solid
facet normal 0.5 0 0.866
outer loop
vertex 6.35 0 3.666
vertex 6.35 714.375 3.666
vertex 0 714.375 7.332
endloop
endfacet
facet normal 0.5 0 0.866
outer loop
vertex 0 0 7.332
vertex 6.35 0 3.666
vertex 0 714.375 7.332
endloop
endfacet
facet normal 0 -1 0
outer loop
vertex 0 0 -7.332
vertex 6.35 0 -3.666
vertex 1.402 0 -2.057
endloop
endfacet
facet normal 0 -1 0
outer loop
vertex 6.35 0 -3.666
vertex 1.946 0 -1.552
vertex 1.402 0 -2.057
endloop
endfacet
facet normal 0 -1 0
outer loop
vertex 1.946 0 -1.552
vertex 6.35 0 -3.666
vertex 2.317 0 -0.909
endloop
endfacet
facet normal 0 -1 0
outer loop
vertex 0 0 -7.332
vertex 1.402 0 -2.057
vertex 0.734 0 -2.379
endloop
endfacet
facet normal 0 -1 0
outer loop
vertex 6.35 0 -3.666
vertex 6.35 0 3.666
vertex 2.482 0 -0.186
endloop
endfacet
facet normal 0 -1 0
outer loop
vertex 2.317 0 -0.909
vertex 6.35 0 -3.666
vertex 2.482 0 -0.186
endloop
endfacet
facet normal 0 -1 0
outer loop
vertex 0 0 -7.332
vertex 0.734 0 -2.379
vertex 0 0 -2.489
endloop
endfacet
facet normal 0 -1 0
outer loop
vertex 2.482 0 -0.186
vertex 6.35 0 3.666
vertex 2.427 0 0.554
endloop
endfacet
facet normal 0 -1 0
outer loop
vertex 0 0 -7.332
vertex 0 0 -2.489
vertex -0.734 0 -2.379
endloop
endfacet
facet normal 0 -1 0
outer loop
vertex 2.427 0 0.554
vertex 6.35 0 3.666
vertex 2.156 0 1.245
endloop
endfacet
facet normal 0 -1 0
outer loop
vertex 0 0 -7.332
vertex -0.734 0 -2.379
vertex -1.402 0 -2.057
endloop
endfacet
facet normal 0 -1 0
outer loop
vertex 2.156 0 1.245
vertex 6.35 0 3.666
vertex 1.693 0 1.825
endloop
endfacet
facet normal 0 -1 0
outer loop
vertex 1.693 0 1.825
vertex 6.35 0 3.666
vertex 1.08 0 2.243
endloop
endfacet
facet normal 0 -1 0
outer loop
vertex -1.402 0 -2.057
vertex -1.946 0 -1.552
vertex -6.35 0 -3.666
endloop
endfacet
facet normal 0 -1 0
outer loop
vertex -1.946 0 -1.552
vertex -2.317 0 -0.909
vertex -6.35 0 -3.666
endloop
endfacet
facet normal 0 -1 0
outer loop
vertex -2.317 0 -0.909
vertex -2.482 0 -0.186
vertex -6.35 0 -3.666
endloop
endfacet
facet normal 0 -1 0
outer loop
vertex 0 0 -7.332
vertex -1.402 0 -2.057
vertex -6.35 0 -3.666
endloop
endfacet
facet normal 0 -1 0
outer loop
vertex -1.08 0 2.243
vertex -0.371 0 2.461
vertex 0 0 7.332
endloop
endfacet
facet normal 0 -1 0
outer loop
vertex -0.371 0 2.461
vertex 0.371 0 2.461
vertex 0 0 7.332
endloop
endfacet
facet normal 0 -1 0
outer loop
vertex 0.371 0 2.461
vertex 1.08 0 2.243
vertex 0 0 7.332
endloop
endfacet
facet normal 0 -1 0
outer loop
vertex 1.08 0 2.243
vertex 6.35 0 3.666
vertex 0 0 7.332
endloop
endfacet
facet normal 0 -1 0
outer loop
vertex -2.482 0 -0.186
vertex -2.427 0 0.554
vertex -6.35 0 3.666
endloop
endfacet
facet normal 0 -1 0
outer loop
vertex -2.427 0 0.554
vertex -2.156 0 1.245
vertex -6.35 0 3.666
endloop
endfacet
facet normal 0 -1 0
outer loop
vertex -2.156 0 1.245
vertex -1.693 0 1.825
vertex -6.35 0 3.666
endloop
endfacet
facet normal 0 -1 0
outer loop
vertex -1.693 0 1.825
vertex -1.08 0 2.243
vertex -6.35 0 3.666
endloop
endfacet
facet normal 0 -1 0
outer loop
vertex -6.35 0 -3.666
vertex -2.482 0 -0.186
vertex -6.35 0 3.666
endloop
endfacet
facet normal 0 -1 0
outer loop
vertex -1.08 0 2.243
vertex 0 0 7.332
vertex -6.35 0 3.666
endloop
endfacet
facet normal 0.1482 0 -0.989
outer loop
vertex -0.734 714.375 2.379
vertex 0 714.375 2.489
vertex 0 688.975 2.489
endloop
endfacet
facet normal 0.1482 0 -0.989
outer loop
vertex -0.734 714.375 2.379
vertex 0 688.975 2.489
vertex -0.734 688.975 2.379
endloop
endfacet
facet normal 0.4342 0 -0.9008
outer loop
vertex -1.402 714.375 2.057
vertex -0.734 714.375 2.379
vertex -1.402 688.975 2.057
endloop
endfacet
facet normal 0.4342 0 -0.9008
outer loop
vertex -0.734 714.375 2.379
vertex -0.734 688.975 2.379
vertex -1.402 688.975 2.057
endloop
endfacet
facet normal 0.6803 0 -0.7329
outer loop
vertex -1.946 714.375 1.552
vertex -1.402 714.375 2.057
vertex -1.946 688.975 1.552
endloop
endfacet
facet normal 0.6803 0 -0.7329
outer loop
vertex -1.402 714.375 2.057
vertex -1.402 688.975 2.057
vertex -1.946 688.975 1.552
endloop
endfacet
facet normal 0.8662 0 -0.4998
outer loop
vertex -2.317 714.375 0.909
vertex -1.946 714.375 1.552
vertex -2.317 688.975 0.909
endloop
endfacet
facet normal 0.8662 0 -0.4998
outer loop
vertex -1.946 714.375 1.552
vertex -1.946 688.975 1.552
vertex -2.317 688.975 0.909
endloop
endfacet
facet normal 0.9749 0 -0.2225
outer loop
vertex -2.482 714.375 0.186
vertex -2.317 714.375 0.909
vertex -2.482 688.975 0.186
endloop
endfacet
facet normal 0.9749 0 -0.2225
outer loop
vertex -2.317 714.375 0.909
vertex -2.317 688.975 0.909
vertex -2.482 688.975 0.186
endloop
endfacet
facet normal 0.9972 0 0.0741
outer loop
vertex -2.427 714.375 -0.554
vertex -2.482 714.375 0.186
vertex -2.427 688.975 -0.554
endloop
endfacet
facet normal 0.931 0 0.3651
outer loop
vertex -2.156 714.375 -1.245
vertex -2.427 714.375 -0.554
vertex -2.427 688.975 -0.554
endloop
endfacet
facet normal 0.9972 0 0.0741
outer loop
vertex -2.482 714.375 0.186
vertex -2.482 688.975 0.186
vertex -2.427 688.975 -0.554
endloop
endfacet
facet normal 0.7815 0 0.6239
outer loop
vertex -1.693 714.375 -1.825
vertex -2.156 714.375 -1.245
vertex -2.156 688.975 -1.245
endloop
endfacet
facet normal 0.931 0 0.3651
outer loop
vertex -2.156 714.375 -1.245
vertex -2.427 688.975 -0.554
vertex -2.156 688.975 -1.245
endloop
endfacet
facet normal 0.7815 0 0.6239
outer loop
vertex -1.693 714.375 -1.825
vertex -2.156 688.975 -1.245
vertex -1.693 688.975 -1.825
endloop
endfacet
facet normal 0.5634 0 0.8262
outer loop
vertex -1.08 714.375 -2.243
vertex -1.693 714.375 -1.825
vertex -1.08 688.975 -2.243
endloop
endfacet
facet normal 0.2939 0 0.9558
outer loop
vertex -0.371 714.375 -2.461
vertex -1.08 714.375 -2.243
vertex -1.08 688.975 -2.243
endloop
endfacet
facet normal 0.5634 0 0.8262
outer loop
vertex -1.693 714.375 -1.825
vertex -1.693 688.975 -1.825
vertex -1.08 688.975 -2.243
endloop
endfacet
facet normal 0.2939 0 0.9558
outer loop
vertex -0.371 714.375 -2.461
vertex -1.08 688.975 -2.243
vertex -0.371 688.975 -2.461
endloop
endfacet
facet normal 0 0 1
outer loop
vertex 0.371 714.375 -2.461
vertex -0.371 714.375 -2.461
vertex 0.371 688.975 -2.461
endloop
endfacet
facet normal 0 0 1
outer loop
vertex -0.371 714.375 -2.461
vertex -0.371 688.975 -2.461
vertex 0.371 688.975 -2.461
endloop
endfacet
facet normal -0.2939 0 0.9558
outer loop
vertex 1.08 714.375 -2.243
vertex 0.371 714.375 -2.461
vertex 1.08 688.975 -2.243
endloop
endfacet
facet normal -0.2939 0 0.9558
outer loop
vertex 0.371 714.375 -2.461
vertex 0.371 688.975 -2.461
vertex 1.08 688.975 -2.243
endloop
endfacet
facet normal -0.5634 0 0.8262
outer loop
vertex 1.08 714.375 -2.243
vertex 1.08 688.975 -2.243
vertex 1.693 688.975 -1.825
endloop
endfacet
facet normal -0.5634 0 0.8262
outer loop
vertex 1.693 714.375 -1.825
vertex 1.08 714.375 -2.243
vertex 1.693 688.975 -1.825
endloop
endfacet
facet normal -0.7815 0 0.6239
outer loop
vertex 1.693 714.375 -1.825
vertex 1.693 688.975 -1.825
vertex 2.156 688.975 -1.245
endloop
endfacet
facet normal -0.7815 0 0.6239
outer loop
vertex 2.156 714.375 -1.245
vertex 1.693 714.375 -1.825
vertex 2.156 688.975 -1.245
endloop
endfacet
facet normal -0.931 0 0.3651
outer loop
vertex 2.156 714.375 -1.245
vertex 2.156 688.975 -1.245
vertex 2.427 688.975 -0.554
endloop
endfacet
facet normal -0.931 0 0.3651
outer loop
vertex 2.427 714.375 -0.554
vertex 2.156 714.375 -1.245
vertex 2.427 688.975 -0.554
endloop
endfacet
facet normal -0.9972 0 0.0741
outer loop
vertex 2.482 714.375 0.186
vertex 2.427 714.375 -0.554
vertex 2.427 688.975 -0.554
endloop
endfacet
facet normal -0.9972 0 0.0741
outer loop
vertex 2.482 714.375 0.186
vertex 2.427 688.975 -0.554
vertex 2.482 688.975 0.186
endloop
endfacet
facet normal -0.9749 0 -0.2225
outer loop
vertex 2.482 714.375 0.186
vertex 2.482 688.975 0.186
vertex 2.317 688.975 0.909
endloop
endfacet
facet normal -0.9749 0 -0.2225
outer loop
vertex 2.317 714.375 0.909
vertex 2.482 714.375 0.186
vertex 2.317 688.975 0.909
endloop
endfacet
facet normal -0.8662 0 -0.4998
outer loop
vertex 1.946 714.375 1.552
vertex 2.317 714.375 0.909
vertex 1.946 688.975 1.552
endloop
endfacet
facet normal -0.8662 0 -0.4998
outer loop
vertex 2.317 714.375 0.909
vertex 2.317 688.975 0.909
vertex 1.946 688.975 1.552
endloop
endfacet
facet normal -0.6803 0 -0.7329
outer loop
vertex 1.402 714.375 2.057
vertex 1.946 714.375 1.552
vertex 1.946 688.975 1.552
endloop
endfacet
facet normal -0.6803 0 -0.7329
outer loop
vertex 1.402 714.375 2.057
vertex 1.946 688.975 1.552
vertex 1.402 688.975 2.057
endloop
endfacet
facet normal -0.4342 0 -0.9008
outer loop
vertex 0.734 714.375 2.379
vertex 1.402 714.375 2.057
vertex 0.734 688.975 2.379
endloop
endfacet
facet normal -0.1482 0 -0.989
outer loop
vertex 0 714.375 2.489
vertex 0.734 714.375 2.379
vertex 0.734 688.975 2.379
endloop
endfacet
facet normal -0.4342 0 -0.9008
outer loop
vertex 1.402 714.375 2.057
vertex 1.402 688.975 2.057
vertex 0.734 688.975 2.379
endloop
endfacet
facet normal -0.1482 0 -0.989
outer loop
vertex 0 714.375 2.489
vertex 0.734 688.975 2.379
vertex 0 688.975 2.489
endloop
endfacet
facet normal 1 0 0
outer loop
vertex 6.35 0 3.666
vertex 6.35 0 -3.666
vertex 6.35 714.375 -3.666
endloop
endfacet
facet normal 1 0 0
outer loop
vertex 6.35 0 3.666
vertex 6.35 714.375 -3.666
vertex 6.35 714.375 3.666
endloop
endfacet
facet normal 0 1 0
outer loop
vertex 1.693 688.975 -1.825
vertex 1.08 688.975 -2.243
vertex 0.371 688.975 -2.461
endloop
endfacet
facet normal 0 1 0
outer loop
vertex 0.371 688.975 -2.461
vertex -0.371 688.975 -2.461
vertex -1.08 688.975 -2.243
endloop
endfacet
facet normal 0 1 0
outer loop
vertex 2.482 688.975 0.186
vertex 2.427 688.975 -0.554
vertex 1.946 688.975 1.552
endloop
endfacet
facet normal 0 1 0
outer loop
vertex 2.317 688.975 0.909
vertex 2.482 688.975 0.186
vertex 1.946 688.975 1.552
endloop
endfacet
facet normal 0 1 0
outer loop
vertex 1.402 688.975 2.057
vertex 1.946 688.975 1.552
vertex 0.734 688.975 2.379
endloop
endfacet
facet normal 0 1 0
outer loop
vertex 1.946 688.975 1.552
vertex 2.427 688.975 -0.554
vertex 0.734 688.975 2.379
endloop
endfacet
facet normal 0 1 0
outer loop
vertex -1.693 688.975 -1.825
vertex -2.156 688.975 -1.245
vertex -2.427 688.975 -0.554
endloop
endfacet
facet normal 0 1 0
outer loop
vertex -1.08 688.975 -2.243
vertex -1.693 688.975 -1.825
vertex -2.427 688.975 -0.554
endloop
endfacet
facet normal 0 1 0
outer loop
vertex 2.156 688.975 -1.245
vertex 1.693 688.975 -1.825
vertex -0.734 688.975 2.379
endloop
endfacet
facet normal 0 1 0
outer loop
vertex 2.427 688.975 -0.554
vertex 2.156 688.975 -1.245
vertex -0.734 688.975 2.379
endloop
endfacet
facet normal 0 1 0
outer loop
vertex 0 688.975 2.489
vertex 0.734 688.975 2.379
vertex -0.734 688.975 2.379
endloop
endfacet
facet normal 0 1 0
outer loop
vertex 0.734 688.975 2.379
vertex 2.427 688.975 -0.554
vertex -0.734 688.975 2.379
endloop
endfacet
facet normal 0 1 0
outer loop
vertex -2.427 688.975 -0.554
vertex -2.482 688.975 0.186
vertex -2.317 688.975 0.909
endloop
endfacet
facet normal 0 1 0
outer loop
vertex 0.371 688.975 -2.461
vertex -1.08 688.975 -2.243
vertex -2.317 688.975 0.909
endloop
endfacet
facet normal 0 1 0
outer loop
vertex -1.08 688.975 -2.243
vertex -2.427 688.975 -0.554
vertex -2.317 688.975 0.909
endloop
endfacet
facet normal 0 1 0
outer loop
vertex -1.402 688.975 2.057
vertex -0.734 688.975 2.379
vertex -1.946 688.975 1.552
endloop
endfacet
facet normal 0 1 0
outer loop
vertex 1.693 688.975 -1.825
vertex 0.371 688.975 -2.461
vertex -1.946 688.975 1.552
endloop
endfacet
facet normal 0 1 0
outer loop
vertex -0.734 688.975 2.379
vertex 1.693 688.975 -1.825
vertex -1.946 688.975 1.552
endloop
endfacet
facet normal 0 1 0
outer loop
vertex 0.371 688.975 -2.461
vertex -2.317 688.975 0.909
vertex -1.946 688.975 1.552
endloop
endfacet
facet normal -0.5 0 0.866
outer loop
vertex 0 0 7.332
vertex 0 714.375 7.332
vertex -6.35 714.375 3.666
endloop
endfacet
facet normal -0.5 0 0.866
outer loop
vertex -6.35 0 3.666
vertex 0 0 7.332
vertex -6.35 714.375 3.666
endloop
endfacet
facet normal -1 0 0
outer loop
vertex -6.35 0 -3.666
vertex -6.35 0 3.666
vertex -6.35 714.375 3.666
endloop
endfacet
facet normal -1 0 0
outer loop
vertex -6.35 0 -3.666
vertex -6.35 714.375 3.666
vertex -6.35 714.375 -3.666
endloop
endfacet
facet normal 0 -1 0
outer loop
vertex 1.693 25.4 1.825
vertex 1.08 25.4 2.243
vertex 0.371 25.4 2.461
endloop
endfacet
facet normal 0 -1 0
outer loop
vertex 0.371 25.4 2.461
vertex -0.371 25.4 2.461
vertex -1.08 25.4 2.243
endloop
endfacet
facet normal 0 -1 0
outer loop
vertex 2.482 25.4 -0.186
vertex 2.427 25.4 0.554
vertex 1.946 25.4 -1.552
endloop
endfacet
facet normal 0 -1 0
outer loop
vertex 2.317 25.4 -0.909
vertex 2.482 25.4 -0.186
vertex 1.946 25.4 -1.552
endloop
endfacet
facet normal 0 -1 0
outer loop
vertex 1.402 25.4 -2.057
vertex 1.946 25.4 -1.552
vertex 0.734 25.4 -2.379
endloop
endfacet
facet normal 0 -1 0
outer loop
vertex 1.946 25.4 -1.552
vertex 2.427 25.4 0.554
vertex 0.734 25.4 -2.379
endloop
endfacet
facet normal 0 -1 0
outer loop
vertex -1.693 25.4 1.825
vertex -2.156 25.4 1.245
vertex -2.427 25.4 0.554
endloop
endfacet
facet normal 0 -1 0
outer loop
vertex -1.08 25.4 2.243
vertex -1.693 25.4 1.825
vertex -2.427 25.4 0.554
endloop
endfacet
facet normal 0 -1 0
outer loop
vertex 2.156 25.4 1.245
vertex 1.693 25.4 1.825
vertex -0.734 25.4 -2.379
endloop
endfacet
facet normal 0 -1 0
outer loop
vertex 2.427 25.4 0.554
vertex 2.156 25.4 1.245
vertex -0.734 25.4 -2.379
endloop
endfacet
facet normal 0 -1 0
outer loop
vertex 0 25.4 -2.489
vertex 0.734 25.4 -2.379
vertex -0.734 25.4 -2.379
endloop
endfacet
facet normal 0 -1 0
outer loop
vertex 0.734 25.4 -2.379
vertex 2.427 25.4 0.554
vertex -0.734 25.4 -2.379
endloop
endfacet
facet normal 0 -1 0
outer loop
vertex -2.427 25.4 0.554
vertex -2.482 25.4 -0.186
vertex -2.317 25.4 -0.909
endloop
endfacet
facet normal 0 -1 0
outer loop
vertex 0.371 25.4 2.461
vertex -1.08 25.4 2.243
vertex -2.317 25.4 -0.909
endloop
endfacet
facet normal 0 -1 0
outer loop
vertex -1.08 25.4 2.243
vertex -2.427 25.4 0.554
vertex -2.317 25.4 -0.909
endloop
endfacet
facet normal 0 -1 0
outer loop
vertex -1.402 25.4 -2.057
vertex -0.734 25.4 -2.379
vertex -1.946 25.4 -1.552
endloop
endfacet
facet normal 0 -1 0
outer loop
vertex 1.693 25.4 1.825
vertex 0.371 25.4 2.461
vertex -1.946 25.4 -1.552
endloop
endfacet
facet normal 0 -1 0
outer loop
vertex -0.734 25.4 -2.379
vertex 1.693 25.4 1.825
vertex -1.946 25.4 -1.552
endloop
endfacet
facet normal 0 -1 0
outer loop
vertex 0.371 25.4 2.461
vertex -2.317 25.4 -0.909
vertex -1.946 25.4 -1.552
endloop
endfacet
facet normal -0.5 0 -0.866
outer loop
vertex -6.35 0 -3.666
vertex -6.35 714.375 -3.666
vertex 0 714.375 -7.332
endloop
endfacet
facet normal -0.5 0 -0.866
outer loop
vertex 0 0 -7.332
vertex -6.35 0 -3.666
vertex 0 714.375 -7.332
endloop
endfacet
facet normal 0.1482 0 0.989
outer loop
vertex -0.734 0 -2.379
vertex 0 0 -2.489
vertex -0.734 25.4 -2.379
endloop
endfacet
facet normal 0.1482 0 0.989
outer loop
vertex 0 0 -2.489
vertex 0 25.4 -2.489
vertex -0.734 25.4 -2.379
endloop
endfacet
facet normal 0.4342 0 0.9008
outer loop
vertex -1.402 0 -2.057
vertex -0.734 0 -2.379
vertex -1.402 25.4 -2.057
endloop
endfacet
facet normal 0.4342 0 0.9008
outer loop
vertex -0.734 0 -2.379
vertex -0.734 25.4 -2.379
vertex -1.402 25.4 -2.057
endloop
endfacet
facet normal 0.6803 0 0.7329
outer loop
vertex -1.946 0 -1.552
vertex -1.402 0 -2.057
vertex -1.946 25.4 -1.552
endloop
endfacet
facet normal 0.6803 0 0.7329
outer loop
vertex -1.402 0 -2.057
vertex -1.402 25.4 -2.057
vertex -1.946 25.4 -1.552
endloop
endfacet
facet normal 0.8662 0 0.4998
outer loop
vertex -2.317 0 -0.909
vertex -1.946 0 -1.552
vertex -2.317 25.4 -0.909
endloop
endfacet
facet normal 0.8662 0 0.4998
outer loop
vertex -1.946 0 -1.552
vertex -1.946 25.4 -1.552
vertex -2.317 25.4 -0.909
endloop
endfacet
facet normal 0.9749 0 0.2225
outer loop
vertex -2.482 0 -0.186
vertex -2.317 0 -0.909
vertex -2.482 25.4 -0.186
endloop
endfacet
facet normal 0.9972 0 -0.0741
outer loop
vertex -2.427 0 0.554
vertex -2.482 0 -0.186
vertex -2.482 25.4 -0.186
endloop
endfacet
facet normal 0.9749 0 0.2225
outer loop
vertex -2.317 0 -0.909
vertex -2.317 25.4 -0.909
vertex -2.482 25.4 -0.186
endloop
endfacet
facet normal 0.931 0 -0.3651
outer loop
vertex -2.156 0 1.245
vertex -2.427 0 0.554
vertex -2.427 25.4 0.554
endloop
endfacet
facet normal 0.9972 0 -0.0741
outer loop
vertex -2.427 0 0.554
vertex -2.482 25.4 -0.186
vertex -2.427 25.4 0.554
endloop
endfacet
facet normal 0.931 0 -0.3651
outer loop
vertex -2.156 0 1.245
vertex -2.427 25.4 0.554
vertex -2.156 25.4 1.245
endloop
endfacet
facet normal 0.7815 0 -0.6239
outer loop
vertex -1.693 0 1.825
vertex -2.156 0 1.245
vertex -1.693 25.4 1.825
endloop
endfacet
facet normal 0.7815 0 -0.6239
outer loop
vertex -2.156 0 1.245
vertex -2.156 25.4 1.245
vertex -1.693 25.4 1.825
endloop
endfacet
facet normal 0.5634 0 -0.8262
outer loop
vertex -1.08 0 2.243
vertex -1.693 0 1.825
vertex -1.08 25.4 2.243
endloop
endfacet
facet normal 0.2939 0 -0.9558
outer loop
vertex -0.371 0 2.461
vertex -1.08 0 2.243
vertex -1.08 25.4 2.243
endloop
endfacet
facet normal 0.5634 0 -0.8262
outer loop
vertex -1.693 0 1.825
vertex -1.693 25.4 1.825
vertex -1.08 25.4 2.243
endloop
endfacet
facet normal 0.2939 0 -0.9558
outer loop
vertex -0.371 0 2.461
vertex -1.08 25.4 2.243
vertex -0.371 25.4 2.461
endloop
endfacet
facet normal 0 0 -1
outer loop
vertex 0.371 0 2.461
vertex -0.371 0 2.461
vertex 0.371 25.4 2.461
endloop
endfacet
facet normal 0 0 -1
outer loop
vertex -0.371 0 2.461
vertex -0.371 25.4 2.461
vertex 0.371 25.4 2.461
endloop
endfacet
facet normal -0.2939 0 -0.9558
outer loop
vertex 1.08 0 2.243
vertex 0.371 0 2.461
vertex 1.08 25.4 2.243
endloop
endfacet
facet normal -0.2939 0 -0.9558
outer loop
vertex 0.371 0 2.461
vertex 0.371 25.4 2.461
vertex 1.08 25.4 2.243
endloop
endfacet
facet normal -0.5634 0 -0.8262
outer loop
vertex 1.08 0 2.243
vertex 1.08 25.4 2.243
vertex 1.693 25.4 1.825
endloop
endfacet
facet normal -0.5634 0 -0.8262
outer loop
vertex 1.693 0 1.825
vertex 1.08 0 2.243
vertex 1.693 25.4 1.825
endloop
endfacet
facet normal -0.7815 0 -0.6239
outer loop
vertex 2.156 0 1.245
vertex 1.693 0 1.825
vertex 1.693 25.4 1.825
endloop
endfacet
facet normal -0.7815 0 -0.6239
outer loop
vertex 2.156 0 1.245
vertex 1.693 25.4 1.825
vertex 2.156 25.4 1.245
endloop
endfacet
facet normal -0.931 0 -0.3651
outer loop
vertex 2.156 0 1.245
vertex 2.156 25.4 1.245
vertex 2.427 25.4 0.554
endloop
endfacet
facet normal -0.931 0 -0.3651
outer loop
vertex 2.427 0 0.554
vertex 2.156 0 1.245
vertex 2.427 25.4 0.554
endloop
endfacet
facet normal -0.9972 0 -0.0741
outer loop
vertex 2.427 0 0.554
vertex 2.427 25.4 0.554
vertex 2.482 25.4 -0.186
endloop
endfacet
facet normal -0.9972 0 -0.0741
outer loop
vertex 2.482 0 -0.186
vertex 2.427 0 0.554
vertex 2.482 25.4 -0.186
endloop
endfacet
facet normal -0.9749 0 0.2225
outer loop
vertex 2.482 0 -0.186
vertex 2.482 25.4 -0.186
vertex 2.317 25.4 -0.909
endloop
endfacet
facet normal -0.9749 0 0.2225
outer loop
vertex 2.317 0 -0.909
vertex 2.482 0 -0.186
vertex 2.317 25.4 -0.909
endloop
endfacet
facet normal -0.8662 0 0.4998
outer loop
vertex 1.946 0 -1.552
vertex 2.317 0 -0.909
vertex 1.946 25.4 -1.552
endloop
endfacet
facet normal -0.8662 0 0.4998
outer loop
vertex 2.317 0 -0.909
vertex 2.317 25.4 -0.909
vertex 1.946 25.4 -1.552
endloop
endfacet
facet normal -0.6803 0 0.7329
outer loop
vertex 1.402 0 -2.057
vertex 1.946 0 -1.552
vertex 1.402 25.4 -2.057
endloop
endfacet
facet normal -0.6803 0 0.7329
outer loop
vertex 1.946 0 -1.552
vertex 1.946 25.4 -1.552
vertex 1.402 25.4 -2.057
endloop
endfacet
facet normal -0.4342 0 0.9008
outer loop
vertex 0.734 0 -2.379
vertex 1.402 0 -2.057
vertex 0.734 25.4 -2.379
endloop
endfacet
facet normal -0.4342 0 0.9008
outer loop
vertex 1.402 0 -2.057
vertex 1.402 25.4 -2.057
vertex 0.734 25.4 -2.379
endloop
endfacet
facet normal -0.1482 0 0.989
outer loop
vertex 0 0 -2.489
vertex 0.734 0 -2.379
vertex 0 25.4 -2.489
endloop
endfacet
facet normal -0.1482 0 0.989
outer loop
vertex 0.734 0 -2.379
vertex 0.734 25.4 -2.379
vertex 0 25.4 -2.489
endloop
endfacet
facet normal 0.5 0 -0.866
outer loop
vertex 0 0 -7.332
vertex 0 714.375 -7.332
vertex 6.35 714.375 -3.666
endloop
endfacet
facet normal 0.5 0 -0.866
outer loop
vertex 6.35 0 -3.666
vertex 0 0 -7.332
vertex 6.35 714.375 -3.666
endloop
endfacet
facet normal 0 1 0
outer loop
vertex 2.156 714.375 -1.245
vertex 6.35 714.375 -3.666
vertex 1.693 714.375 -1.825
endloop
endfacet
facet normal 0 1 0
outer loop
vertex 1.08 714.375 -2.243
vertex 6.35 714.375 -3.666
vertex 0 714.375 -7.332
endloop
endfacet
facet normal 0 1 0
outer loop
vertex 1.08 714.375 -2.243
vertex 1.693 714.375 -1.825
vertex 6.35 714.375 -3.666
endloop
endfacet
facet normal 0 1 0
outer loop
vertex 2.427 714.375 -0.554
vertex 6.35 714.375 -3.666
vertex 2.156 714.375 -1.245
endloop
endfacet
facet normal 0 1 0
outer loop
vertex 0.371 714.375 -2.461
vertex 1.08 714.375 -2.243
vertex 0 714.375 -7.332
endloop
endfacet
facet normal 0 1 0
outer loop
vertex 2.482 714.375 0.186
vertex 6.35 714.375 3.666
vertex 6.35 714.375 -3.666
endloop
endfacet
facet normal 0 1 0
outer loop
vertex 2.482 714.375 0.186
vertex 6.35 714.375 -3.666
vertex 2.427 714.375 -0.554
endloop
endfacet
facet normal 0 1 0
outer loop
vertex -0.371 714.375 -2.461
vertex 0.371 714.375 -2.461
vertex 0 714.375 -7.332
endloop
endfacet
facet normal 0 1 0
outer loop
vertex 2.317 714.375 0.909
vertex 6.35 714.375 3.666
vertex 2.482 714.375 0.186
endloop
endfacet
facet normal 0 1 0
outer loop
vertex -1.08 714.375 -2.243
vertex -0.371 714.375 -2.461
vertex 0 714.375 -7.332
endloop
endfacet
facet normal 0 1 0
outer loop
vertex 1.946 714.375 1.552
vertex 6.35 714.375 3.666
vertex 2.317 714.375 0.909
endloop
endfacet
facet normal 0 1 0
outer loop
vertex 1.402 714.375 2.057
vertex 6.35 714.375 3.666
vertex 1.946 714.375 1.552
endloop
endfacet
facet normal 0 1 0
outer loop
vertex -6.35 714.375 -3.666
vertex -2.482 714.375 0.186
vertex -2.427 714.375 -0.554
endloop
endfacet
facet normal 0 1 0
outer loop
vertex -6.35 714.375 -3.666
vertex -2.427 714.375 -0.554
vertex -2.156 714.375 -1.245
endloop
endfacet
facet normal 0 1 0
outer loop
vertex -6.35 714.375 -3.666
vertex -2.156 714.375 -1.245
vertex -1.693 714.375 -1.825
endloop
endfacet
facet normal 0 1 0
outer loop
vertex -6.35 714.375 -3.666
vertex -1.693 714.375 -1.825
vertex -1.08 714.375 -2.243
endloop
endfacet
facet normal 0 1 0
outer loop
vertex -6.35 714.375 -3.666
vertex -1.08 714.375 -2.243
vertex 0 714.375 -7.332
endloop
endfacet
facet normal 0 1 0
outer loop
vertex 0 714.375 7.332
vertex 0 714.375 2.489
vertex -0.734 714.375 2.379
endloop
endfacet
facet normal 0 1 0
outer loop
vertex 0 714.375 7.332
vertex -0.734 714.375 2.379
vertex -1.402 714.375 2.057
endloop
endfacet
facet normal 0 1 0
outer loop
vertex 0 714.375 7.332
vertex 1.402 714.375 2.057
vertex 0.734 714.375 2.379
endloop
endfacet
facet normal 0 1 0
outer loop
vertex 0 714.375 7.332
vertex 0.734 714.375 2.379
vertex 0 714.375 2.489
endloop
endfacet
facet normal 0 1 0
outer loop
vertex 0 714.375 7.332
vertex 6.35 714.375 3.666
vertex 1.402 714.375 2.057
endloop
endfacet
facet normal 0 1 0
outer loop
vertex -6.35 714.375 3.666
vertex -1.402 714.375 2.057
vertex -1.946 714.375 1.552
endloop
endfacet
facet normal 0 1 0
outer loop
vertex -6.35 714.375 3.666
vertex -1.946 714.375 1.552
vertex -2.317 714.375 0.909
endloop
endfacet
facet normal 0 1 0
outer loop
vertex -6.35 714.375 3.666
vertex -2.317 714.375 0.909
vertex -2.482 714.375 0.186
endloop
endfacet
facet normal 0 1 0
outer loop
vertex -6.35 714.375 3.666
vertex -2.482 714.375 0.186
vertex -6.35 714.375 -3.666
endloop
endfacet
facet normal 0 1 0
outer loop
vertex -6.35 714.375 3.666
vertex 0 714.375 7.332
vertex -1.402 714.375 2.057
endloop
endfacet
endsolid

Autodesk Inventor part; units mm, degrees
ref_plane "YZ Plane" through (0, 0, 0) normal (1, 0, 0) x (0, 1, 0)
ref_plane "XZ Plane" through (0, 0, 0) normal (0, 1, 0) x (-1, 0, 0)
ref_plane "XY Plane" through (0, 0, 0) normal (0, 0, 1) x (1, 0, 0)
sketch "Sketch1" plane through (0, 0, 0) normal (0, 1, 0) x (-1, 0, 0)
  line L0 (6.35, -3.6662) -> (0, -7.3323)
  line L1 (0, -7.3323) -> (-6.35, -3.6662)
  line L2 (-6.35, -3.6662) -> (-6.35, 3.6662)
  line L3 (-6.35, 3.6662) -> (0, 7.3323)
  line L4 (0, 7.3323) -> (6.35, 3.6662)
  line L5 (6.35, 3.6662) -> (6.35, -3.6662)
  point P0 (0, 0)
  point P1 (0, 0)
  point P2 (0, 0)
  dimension "d0" = 12.7
extrude "Extrusion1" add sketch "Sketch1" along normal blind 714.375
sketch "Sketch2" plane through (0, 0, 0) normal (0, -1, 0) x (1, 0, 0)
  point P0 (0, 0)
  point P1 (0, 0)
hole "Hole1" at (0, 0, 0) direction (0, 1, 0) diameter 4.9784 depth 25.4 thread size "1/4-20 UNC" class "2B" standard "ANSI Unified Screw Threads"
sketch "Sketch3" plane through (0, 714.375, 0) normal (0, 1, 0) x (1, 0, 0)
  point P0 (0, 0)
  point P1 (0, 0)
hole "Hole2" at (0, 714.375, 0) direction (0, -1, 0) diameter 4.9784 depth 25.4 thread size "1/4-20 UNC" class "2B" standard "ANSI Unified Screw Threads"
properties part number "Intake HexShaft 2" material "Aluminum 7075"
